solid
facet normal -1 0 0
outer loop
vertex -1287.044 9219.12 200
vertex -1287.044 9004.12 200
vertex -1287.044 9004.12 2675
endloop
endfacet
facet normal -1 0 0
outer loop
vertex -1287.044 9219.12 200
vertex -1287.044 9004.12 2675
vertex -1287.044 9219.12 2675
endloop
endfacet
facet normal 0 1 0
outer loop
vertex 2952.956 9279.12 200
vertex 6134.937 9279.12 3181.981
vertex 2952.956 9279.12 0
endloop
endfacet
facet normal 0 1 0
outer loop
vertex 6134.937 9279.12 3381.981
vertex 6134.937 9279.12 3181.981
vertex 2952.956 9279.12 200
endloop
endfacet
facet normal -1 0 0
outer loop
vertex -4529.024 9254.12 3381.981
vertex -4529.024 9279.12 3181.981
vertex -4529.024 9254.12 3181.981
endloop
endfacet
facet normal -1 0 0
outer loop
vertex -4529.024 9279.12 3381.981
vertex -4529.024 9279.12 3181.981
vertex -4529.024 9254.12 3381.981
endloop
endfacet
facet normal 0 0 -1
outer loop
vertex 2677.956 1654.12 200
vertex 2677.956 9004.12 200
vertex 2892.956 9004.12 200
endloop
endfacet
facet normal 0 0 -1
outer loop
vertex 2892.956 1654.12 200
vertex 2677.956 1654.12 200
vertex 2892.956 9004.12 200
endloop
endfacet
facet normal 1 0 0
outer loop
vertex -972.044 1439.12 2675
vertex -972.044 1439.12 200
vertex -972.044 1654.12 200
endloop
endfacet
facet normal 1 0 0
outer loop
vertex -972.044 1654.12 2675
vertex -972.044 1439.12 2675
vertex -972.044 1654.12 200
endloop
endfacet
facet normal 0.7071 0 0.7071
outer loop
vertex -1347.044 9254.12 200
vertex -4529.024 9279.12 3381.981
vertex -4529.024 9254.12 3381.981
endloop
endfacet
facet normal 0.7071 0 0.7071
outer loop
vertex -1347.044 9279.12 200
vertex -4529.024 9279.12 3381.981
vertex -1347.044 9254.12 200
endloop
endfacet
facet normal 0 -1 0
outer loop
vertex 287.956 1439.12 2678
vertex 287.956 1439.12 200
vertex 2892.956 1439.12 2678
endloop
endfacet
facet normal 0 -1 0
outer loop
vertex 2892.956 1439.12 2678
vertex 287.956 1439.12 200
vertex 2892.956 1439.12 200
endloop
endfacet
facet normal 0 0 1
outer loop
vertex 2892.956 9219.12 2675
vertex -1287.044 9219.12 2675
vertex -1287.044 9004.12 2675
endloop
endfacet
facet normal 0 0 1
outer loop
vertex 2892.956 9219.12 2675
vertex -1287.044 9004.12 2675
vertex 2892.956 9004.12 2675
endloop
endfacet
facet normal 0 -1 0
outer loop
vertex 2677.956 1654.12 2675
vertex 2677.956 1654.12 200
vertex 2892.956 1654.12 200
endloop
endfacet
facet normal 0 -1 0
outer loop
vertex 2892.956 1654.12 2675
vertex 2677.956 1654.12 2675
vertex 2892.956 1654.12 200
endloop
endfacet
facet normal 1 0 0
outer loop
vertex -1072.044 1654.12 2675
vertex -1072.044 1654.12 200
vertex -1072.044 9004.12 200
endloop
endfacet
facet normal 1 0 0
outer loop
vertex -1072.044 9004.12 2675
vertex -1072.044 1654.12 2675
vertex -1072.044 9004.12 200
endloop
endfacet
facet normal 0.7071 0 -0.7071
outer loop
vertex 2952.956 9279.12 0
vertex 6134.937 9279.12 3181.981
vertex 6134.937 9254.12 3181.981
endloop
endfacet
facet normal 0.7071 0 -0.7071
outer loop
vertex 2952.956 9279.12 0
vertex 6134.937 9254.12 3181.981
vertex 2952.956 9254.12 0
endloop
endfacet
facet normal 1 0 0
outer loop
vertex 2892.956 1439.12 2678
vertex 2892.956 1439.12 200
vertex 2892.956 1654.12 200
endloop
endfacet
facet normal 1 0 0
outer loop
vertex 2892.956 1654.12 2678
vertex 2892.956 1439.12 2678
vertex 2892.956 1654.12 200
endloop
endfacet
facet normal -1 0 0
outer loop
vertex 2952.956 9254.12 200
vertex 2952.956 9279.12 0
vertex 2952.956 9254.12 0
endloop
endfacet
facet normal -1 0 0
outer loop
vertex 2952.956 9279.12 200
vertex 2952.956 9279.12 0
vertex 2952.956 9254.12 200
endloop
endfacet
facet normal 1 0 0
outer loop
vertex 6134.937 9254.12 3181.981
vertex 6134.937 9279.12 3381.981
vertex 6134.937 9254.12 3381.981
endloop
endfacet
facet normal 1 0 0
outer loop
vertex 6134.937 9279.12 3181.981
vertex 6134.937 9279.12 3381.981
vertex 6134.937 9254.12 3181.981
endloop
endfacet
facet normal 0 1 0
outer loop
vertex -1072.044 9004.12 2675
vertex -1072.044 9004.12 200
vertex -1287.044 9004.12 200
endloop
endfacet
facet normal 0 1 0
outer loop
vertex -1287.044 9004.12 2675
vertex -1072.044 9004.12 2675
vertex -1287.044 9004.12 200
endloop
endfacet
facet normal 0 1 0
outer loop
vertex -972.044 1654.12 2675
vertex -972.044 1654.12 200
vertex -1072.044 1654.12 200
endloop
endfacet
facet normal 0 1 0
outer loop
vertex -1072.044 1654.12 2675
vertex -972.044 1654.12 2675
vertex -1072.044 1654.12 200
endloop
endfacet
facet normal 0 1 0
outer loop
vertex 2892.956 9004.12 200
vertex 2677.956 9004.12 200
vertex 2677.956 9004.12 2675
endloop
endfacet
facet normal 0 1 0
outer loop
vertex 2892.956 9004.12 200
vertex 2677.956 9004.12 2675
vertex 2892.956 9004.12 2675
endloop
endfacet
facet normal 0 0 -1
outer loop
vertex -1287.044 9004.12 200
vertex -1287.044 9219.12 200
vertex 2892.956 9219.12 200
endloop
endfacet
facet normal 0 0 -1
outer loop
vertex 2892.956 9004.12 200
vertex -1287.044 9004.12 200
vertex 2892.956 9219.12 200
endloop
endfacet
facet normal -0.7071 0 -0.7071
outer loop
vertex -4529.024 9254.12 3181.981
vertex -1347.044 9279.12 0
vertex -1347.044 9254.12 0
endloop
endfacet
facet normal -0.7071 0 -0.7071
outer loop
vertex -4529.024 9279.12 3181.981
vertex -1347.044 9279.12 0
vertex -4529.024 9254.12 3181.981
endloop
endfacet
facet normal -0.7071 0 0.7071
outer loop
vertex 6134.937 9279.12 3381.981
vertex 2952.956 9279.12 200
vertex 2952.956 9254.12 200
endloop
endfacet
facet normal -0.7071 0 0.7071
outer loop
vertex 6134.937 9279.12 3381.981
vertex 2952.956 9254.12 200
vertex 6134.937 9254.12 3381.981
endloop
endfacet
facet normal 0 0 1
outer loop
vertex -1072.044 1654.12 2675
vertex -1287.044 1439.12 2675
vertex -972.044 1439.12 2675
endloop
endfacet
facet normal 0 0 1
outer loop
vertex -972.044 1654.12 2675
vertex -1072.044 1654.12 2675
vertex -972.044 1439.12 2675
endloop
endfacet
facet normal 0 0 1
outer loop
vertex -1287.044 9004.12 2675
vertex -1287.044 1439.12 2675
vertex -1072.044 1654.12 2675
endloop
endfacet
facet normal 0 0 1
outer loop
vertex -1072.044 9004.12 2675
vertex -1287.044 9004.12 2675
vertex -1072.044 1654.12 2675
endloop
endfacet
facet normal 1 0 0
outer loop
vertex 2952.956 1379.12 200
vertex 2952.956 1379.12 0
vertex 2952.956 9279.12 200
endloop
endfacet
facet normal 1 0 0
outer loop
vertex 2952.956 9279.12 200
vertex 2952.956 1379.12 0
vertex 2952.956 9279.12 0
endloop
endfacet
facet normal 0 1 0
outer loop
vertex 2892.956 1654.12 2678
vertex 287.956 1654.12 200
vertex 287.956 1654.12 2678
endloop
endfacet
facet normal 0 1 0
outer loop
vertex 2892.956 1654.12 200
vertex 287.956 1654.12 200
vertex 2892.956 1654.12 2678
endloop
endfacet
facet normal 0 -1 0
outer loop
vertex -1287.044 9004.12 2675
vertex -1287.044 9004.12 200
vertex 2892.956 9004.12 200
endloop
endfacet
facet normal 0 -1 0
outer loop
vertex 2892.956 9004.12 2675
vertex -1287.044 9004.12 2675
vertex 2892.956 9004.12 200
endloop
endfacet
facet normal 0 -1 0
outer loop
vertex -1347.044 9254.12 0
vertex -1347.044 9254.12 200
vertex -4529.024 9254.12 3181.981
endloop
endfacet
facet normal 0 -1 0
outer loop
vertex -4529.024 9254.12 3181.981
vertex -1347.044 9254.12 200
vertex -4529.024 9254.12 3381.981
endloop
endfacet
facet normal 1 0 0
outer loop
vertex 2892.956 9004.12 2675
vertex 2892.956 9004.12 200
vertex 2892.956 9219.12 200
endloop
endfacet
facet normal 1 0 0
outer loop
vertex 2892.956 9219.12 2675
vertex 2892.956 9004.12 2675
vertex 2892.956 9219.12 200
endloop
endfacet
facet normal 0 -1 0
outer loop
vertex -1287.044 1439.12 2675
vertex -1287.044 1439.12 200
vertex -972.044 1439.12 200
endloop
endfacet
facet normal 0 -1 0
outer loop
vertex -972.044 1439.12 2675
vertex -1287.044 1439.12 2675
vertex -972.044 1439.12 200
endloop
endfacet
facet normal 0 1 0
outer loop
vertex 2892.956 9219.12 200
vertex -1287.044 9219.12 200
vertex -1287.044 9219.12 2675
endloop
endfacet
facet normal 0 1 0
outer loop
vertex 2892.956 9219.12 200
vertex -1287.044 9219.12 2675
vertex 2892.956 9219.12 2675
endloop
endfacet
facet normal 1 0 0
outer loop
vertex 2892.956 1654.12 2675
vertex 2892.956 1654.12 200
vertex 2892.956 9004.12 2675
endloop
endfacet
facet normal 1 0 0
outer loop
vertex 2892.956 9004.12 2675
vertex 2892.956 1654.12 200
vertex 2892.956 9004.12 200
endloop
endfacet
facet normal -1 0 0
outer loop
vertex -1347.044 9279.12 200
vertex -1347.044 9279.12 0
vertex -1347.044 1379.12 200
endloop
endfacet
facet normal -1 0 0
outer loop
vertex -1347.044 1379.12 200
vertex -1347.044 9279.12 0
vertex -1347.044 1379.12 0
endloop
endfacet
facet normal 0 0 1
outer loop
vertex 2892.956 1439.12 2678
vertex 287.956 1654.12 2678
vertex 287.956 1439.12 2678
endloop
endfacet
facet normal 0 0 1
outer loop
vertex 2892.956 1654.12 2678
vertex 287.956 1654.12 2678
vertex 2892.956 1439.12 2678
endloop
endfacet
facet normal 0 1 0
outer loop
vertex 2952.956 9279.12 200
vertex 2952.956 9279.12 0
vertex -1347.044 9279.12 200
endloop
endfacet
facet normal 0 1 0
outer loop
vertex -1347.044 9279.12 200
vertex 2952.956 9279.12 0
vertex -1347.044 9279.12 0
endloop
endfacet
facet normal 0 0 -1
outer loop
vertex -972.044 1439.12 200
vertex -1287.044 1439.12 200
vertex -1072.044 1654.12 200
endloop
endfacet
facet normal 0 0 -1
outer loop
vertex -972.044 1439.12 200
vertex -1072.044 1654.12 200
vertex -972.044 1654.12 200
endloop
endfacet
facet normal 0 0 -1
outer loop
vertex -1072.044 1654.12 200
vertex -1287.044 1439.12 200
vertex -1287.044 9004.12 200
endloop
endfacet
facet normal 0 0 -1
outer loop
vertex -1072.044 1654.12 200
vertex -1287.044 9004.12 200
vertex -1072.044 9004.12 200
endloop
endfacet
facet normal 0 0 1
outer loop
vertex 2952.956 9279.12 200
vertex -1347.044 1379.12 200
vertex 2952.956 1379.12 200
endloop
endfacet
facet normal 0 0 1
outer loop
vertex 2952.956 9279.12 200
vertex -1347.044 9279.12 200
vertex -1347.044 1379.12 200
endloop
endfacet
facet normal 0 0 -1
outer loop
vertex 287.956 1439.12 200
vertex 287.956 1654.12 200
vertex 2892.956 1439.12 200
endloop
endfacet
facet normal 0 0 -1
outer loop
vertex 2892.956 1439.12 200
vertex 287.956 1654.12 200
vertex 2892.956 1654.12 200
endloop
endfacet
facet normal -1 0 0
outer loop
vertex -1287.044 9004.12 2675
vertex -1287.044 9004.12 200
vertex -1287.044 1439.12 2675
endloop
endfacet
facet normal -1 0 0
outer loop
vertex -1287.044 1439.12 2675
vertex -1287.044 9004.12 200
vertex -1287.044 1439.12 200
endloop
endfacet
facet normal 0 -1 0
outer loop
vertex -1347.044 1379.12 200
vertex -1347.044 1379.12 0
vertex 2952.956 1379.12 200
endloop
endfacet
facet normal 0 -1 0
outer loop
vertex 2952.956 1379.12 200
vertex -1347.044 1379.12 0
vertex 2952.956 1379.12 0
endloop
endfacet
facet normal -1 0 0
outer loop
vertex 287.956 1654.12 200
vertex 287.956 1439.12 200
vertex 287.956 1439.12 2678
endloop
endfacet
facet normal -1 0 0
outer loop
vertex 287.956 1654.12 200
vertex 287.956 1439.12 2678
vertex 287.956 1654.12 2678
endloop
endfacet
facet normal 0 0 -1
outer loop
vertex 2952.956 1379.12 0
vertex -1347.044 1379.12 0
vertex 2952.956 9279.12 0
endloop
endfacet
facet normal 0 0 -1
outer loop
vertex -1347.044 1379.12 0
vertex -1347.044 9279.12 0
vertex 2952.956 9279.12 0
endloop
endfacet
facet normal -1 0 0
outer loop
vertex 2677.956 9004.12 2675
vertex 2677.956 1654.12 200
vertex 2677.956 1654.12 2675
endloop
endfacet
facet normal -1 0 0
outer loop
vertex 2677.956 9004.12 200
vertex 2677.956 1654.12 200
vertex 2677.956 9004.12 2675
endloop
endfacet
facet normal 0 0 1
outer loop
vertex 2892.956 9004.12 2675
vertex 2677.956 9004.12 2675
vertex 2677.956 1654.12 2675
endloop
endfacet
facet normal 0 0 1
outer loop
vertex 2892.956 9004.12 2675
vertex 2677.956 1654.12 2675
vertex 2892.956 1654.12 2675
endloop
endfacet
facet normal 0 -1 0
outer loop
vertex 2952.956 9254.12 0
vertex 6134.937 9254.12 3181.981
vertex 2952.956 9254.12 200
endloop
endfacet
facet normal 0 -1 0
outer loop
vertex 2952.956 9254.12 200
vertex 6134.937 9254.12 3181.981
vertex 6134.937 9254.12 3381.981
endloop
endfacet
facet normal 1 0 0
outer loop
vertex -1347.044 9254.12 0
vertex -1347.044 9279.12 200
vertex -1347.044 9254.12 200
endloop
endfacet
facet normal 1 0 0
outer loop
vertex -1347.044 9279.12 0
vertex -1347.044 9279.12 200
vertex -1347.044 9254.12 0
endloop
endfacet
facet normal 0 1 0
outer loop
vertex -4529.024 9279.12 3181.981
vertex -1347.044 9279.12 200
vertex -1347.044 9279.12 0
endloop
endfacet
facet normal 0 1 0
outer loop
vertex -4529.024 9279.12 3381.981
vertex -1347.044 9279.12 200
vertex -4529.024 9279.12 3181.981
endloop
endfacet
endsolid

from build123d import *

# Parameters (mm, degrees)
F1_DEPTH  = 200
F2_W      = 215
F2_H      = 7350
F3_DEPTH  = 2475
F5_DEPTH  = 2475
F6_W      = 4180
F6_H      = 215
F7_DEPTH  = 2475
F9_DEPTH  = 25
F10_DEPTH = 25
F11_W     = 2605
F11_H     = 215
F12_DEPTH = 2478


with BuildPart() as f1:
    # F0 (on Top) → F1 (new body)
    with BuildSketch(Plane.XY):
        Polygon((-1347.0436407789, 1379.1199190657), (855.9563592211, 1379.1199190657), (2952.9563592211, 1379.1199190657), (2952.9563592211, 9279.1199190657), (-1347.0436407789, 9279.1199190657), align=None)
    extrude(amount=F1_DEPTH)


with BuildPart() as f3:
    # F2 (on face) → F3 (new body)
    with BuildSketch(Plane.XY.offset(200)):
        with Locations((2785.4563592211, 5329.1199190657)):
            Rectangle(F2_W, F2_H)
    extrude(amount=F3_DEPTH)


with BuildPart() as f5:
    # F4 (on face) → F5 (new body)
    with BuildSketch(Plane.XY.offset(200)):
        Polygon((-1072.0436407789, 9004.1199190657), (-1287.0436407789, 9004.1199190657), (-1287.0436407789, 1439.1199190657), (-972.0436407789, 1439.1199190657), (-972.0436407789, 1654.1199190657), (-1072.0436407789, 1654.1199190657), align=None)
    extrude(amount=F5_DEPTH)


with BuildPart() as f7:
    # F6 (on face) → F7 (new body)
    with BuildSketch(Plane.XY.offset(200)):
        with Locations((802.9563592211, 9111.6199190657)):
            Rectangle(F6_W, F6_H)
    extrude(amount=F7_DEPTH)


with BuildPart() as f9:
    # F8 (on face) → F9 (new body)
    with BuildSketch(Plane(origin=(0, 9279.1199190657, 0), x_dir=(-1, 0, 0), z_dir=(0, 1, 0))):
        Polygon((-6134.9368745606, 3181.9805153395), (-2952.9563592211, 0), (-2952.9563592211, 200), (-6134.9368745606, 3381.9805153395), align=None)
    extrude(amount=-F9_DEPTH)


with BuildPart() as f10:
    # F8 (on face) → F10 (new body)
    with BuildSketch(Plane(origin=(0, 9279.1199190657, 0), x_dir=(-1, 0, 0), z_dir=(0, 1, 0))):
        Polygon((1347.0436407789, 200), (1347.0436407789, 0), (4529.0241561183, 3181.9805153395), (4529.0241561183, 3381.9805153395), align=None)
    extrude(amount=-F10_DEPTH)


with BuildPart() as f12:
    # F11 (on face) → F12 (new body)
    with BuildSketch(Plane.XY.offset(200)):
        with Locations((1590.4563592211, 1546.6199190657)):
            Rectangle(F11_W, F11_H)
    extrude(amount=F12_DEPTH)


solid = Compound([f1.part, f3.part, f5.part, f7.part, f9.part, f10.part, f12.part])
